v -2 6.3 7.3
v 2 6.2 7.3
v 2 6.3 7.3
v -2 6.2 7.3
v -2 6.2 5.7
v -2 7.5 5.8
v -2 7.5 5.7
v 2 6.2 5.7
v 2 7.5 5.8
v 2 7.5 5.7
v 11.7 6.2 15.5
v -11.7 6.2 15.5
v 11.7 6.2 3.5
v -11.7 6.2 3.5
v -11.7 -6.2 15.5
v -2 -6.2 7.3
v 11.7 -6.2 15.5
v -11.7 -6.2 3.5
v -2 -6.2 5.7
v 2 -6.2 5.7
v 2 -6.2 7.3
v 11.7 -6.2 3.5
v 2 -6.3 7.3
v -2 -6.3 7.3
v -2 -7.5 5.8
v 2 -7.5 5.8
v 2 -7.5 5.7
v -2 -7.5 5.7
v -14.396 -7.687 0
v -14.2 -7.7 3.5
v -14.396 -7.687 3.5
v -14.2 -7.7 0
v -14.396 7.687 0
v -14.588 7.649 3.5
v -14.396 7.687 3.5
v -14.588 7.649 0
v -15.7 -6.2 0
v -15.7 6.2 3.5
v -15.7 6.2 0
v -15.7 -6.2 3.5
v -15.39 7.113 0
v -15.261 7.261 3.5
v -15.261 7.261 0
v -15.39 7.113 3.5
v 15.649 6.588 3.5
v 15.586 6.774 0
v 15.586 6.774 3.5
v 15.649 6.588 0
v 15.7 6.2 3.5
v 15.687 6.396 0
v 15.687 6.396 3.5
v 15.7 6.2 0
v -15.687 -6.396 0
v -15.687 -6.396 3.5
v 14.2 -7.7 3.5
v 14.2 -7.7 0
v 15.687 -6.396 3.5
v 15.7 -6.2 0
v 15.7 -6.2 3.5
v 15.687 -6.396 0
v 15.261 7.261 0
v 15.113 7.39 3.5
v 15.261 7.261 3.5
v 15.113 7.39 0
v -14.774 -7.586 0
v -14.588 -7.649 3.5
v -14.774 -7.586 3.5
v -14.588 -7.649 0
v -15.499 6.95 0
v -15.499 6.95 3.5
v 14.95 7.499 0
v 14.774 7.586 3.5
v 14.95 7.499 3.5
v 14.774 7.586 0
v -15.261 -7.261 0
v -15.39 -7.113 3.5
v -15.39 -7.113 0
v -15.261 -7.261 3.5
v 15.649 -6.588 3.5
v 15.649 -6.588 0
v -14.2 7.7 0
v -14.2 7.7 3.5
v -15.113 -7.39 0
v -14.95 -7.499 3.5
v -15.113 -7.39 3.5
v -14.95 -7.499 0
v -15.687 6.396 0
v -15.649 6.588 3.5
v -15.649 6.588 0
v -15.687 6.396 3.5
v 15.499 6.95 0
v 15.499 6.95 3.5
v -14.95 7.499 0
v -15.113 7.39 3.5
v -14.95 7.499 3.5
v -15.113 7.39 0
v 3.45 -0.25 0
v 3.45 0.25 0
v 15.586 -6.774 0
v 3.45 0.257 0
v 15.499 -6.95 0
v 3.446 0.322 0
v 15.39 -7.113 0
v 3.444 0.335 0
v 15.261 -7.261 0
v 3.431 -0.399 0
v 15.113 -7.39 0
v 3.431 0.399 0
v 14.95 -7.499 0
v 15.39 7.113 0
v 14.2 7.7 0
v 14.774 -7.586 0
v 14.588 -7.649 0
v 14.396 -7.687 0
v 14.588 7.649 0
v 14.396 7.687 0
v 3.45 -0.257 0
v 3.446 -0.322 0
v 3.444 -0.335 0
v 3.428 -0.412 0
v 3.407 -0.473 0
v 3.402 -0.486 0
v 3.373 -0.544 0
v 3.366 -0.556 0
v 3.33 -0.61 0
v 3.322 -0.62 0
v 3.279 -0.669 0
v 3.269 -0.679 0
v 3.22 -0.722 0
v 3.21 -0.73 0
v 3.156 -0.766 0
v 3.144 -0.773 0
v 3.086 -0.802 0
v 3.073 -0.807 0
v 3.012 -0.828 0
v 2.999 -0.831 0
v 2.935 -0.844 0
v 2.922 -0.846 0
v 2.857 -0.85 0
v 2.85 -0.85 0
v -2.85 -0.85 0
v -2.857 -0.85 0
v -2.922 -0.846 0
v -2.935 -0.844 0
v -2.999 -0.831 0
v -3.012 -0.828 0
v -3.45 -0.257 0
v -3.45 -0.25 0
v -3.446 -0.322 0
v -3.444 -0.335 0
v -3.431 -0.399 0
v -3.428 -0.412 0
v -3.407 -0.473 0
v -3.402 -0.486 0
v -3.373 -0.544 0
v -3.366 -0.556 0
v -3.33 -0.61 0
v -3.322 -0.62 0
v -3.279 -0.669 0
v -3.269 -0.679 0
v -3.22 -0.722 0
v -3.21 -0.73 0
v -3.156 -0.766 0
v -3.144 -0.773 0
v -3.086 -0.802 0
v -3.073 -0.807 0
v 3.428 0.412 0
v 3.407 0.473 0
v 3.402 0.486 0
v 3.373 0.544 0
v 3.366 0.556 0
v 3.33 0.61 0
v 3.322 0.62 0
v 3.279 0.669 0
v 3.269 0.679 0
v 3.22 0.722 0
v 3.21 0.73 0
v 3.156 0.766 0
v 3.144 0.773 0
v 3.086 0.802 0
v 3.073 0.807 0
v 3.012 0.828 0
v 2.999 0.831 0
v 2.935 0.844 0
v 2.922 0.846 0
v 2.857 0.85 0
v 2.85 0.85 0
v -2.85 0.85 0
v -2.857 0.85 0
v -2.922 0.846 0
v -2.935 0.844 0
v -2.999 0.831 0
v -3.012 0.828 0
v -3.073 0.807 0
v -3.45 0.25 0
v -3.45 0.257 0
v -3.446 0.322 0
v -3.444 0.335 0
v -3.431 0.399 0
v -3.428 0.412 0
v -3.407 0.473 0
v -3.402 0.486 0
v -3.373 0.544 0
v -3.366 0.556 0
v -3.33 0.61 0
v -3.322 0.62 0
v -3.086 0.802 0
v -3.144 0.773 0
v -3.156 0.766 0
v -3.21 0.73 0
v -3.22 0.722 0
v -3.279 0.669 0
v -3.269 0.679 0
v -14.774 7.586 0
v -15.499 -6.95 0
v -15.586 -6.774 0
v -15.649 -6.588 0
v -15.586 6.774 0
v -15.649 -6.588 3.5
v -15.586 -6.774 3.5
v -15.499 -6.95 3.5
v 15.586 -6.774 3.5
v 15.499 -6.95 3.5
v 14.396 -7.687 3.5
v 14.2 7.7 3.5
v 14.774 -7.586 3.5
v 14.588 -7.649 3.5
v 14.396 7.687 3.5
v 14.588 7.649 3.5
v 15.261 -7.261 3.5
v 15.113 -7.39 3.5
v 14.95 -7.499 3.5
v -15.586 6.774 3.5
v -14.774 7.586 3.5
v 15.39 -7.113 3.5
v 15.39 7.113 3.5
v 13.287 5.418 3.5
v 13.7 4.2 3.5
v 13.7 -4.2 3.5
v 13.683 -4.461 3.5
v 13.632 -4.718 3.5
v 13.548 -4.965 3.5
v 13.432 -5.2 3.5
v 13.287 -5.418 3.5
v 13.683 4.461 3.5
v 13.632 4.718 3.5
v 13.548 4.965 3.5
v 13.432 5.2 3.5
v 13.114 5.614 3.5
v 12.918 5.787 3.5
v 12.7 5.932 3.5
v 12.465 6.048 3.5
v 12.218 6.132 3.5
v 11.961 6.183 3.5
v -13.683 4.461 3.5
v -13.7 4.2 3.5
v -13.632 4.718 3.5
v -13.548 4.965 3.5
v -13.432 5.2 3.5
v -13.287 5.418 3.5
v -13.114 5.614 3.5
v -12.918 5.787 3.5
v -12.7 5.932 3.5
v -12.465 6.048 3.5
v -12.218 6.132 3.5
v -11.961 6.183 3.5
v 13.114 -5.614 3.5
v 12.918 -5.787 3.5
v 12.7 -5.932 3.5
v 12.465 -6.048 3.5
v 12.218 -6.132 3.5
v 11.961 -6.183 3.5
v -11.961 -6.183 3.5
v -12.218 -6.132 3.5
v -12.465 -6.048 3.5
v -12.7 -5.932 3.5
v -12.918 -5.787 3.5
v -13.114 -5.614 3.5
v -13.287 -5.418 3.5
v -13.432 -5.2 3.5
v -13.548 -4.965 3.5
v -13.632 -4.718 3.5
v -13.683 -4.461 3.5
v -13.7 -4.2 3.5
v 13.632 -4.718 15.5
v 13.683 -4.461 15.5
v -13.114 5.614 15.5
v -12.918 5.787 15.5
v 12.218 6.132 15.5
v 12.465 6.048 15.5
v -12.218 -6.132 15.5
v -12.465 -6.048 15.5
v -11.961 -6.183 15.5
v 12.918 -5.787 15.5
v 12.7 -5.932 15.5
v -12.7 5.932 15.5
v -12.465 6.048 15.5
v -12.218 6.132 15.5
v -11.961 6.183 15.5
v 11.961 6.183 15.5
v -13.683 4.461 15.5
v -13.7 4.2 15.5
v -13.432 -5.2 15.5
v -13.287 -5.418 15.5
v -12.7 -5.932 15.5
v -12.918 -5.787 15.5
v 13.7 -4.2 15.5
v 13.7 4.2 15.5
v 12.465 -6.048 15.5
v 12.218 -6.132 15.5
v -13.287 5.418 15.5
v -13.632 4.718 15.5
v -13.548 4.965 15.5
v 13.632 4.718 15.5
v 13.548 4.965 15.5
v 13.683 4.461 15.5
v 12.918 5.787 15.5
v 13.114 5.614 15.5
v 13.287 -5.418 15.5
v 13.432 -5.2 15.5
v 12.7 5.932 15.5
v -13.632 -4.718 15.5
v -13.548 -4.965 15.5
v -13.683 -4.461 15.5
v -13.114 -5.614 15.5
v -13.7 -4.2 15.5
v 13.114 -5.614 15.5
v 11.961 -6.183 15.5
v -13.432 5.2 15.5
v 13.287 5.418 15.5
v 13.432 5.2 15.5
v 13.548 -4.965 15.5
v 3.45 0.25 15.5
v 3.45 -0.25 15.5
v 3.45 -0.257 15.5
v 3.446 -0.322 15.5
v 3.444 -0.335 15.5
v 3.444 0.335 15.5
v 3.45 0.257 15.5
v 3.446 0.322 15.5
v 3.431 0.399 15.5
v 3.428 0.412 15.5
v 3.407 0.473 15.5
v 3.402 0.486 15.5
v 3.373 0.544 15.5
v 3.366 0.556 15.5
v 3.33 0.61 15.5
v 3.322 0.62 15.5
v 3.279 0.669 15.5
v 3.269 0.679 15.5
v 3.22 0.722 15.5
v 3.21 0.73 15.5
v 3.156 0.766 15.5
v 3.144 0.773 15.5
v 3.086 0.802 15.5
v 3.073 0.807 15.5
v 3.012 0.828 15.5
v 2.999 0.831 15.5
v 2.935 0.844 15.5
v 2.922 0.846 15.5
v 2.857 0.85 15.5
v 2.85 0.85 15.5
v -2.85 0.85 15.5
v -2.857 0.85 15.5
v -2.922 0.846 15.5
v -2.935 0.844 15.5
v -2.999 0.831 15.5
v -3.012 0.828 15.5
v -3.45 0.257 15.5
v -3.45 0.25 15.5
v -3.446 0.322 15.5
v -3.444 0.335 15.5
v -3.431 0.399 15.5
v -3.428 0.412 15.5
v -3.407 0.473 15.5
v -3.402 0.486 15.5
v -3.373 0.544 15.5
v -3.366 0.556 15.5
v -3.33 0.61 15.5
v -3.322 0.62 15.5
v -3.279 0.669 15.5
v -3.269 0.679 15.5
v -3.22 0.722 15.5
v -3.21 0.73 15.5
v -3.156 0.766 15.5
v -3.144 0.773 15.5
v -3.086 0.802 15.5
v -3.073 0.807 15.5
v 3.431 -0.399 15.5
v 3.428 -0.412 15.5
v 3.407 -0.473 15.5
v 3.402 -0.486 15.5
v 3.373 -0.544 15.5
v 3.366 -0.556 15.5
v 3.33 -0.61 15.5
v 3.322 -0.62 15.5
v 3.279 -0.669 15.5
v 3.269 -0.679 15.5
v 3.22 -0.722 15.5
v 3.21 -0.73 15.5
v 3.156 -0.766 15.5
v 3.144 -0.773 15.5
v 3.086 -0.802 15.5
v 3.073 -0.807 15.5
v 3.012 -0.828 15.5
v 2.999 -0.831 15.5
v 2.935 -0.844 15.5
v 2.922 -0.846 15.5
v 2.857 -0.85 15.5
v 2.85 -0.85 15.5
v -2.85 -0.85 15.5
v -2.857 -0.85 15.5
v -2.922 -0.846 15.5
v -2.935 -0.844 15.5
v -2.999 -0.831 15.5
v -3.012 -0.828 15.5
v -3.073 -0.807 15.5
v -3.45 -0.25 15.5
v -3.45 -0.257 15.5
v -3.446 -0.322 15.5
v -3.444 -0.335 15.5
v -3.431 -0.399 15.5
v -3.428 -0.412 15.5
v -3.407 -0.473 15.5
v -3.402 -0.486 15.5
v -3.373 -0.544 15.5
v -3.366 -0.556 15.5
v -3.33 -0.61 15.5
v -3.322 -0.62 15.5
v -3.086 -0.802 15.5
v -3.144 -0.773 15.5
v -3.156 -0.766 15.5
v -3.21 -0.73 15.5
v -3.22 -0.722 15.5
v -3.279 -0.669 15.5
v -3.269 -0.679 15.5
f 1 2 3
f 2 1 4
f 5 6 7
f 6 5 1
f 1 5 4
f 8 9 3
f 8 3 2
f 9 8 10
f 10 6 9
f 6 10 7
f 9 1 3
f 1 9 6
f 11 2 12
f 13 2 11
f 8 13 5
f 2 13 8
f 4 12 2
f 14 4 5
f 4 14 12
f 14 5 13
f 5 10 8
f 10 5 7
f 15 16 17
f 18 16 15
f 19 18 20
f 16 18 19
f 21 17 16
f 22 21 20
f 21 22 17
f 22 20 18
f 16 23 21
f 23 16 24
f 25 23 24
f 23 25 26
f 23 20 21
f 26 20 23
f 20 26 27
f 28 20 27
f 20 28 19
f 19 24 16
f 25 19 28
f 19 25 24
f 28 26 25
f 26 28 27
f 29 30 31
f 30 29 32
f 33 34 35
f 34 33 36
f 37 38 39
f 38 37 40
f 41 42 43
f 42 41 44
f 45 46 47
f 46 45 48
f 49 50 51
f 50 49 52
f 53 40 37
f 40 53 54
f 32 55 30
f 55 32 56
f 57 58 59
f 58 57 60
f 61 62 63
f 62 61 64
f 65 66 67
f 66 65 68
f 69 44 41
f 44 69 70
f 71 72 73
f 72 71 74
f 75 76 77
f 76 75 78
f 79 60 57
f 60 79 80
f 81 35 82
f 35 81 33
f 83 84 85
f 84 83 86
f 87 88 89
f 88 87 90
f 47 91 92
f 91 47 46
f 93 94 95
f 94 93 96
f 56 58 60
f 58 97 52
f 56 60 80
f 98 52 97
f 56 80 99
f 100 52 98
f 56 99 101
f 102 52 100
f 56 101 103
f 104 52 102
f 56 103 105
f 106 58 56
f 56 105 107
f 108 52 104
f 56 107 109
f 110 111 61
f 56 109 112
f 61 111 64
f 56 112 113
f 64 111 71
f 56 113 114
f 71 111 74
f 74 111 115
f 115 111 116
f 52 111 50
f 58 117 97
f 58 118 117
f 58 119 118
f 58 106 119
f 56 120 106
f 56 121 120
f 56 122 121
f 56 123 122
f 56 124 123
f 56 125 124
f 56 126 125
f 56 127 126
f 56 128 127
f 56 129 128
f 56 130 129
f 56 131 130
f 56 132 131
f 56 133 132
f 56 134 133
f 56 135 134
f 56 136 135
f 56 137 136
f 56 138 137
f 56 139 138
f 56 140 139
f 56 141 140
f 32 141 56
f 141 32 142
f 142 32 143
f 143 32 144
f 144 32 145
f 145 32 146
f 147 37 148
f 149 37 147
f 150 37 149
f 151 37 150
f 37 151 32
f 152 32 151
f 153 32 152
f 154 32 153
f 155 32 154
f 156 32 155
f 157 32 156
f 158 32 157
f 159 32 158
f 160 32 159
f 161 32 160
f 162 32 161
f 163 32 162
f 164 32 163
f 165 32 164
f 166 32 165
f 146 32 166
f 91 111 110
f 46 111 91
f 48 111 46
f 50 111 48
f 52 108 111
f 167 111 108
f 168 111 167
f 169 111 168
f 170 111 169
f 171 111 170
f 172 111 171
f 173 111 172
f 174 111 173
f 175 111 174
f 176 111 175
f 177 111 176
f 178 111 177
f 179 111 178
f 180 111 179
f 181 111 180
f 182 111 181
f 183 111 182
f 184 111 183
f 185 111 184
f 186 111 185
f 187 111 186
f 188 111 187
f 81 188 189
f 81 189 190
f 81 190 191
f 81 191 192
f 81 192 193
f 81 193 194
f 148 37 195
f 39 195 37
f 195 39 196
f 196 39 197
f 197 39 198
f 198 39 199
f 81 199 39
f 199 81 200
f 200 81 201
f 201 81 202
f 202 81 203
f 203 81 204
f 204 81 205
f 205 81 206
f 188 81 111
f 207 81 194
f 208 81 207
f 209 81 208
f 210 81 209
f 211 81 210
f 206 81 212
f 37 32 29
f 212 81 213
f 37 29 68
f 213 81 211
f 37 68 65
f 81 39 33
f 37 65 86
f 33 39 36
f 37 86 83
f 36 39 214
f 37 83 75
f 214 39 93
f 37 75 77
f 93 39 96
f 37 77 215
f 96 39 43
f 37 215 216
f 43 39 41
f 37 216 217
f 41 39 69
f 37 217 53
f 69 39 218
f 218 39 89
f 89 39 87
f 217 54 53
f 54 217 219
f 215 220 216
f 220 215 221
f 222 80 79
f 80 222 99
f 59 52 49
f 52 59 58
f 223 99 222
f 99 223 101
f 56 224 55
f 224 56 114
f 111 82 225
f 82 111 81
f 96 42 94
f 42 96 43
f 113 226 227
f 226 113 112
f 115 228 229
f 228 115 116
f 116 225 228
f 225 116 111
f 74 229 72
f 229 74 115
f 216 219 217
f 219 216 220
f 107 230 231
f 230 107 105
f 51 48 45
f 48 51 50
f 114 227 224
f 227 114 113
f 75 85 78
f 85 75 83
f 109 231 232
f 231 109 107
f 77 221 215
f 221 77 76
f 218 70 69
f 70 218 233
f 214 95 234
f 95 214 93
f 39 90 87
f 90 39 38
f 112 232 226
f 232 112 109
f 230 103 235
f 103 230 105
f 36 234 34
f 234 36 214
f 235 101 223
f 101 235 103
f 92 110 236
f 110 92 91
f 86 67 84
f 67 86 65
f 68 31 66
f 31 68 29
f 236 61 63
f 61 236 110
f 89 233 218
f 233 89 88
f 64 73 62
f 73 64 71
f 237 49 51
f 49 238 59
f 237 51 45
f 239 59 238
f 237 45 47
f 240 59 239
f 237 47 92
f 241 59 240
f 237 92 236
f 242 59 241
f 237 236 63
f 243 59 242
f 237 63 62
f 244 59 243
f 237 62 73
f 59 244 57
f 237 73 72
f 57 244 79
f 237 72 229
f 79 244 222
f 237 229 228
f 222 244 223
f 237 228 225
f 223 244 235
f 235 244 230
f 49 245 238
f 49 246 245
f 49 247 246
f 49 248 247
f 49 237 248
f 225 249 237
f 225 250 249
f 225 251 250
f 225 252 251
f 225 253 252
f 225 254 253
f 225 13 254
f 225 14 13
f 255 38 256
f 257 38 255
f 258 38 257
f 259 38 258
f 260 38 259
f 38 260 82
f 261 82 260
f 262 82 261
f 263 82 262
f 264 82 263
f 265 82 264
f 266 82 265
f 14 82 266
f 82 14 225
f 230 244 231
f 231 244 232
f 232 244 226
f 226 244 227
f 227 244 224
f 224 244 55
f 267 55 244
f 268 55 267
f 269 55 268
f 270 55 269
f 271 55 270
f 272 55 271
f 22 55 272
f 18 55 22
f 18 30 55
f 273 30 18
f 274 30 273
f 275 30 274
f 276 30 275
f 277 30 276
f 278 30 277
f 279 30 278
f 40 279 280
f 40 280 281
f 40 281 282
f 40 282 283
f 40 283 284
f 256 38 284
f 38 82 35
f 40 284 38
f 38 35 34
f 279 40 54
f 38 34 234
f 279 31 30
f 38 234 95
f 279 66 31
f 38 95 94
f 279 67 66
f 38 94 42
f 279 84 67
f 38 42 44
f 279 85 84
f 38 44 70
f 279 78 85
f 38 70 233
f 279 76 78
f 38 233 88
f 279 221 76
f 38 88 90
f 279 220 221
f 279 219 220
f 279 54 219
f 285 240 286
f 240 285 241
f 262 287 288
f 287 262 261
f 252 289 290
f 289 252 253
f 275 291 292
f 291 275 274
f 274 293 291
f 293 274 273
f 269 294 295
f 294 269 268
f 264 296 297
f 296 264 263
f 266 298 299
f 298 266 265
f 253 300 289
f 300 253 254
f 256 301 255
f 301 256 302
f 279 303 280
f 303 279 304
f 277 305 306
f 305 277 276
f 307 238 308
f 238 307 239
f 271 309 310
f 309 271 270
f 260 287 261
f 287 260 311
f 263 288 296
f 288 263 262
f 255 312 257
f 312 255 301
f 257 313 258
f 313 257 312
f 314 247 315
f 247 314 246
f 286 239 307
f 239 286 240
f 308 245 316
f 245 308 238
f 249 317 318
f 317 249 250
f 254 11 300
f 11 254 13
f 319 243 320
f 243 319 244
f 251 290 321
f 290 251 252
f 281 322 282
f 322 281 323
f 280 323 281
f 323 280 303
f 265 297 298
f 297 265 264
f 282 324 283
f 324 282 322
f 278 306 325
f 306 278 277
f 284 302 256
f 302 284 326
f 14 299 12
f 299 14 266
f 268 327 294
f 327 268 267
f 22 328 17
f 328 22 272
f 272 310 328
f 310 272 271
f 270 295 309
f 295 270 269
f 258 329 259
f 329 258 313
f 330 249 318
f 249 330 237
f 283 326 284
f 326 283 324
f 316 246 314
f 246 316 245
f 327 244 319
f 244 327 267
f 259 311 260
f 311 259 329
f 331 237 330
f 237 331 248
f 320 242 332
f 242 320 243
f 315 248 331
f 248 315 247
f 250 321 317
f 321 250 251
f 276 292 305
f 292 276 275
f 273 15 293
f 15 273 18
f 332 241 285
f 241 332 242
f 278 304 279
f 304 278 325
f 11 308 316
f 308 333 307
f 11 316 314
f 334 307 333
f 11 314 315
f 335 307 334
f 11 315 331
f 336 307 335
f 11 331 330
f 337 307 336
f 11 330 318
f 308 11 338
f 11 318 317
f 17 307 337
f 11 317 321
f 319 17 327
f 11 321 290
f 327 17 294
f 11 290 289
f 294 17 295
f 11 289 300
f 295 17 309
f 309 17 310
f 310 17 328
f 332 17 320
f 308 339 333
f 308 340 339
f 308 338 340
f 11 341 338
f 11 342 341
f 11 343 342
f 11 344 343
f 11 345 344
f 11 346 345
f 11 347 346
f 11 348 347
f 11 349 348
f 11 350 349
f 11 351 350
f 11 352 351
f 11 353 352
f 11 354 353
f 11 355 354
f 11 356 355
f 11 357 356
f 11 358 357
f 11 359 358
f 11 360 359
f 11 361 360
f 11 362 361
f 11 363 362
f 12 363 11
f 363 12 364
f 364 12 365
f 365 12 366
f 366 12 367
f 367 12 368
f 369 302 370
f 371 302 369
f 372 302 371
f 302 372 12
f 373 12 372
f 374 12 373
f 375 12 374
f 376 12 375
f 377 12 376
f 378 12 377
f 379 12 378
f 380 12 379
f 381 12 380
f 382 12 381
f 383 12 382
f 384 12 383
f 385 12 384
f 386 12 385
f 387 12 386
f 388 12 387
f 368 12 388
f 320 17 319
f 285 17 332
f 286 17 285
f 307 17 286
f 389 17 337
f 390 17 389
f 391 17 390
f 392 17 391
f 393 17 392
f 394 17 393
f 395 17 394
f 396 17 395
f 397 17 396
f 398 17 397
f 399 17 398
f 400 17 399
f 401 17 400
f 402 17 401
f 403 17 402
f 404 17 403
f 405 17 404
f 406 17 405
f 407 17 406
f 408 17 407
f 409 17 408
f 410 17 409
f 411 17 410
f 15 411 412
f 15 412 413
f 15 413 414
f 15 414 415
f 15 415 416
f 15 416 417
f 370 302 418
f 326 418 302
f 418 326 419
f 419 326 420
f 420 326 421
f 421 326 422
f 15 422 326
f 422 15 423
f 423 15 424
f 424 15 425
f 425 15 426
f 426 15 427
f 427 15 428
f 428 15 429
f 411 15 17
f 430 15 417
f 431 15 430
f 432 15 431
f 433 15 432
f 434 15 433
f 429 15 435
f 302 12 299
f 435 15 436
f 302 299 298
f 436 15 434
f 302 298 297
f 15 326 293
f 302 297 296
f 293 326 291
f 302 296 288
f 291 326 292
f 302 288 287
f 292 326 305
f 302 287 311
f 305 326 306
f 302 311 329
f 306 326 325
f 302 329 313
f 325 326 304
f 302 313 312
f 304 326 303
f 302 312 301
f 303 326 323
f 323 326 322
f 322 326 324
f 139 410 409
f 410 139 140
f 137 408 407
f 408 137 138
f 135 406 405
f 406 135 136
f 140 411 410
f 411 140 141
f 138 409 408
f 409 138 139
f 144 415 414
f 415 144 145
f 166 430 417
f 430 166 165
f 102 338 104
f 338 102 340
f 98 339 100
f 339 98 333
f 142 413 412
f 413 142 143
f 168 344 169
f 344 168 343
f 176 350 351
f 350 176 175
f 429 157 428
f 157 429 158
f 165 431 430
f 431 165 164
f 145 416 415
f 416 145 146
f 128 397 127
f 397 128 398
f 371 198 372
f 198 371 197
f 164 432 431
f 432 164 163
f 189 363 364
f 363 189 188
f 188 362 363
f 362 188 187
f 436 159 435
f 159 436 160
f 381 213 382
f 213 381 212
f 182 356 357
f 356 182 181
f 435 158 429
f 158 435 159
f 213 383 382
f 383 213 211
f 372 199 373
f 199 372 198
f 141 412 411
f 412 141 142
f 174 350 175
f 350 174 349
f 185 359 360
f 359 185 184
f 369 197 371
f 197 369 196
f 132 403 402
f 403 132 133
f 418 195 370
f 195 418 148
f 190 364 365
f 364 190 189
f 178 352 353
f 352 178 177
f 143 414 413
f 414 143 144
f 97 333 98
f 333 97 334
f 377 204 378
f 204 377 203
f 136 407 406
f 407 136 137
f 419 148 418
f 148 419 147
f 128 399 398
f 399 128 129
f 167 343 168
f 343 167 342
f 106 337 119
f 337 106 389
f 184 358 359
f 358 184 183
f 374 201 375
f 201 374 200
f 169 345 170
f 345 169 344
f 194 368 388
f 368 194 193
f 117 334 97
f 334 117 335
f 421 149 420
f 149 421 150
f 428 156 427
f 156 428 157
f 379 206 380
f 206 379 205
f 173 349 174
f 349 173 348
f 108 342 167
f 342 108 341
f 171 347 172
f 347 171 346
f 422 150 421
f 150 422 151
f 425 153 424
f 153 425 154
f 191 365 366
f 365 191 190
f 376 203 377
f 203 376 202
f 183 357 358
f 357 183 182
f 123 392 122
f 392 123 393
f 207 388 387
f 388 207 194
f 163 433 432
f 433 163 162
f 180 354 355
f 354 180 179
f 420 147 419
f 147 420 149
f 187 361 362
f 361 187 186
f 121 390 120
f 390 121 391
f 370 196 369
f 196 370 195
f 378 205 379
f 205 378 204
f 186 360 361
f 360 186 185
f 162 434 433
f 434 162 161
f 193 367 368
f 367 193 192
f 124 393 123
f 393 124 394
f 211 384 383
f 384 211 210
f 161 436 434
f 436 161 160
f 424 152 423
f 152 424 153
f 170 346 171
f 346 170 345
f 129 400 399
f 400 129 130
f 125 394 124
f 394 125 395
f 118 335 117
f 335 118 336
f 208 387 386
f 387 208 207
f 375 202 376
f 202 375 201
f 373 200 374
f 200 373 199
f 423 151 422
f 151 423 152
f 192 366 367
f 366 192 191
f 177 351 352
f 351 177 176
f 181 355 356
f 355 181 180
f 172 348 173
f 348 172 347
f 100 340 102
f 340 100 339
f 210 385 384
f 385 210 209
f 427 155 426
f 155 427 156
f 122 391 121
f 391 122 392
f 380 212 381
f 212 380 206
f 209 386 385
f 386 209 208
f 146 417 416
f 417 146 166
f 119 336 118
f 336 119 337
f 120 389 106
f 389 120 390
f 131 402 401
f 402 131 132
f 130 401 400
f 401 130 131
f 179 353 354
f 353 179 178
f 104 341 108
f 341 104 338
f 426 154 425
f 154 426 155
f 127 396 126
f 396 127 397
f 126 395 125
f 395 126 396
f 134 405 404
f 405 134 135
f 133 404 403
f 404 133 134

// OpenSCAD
// file: parameters.scad
// ============================================
// MODULAR CABLE ORGANIZER - SHARED PARAMETERS
// ============================================
// All dimensions in mm - include this in all files
// ============================================

$fn = 48;

// === TOLERANCES ===
clearance = 0.3;
port_clearance = 0.1;  // Extra clearance for port openings (reduced - 0.2 was too loose for USB-C)
wall = 1.6;

// === SLOT DIMENSIONS (2:1 aspect ratio) - scaled to 2/3 ===
slot_width = 32;  // Reduced by 1mm for more compact insert
slot_height = 16;  // Reduced by 1mm for more compact insert
slot_depth = 4;  // Reduced from 6mm - less frame depth needed

// === FRAME STRUCTURE ===
frame_wall = 0.5;   // Reduced for more compact frame
frame_border = 8;  // Increased by 10mm for mounting holes with countersink
frame_back = 2;     // Slightly thicker for snap catch strength
mount_hole_dia = 3;
countersink_dia = 6;  // Diameter of countersink for screw heads
countersink_depth = 2;  // Depth of countersink

// === GRID ===
grid_cols = 2;
grid_rows = 2;

// === INSERT BASE DIMENSIONS ===
insert_width = slot_width - (2 * clearance);
insert_height = slot_height - (2 * clearance);
insert_base_depth = slot_depth - 0.5;

// === INSERT BODY (protrudes from frame) ===
insert_body_width = insert_width - 4;
insert_body_height = insert_height - 3;
insert_body_depth = 12;  // Deep enough to accommodate male cable connectors
insert_top_thick = 1.5;  // Top platform thickness

// === SNAP TABS (on neck/body - catch on back plate) ===
snap_tab_width = 4;
snap_tab_protrude = 1.2;  // How far tab sticks out from body
snap_tab_thick = 1.5;     // Z thickness of tab
snap_tab_offset = 2.2;      // Distance from base to tab bottom on insert (increased to clear frame)

// === CONNECTOR PORT DIMENSIONS & BODY DEPTHS ===
// Port dimensions from reference blueprints
// Body depths sized to match typical male connector lengths

// USB-C: 8.4 x 2.6mm, male connector ~9mm
usbc_w = 8.4;
usbc_h = 2.6;
usbc_r = 1.0;
usbc_body_depth = 9;

// USB-A: 14.0 x 6.5mm, male connector ~13mm
usba_w = 14.0;
usba_h = 6.5;
usba_r = 0.5;
usba_body_depth = 13;

// USB Mini: 6.9 x 3.0mm, male connector ~9mm
usb_mini_w = 6.9;
usb_mini_h = 3.0;
usb_mini_r = 0.5;
usb_mini_body_depth = 9;

// USB Micro: 6.9 x 1.8mm, male connector ~7mm
usb_micro_w = 6.9;
usb_micro_h = 1.8;
usb_micro_r = 0.3;
usb_micro_body_depth = 7;

// USB-B: 8.0 x 7.5mm, male connector ~14mm
usb_b_w = 8.0;
usb_b_h = 7.5;
usb_b_r = 1.0;
usb_b_body_depth = 14;

// Lightning: 6.7 x 1.5mm, male connector ~8mm
lightning_w = 6.7;
lightning_h = 1.5;
lightning_r = 0.5;
lightning_body_depth = 8;

// HDMI: 14.0 x 4.5mm, male connector ~16mm
hdmi_w = 14.0;
hdmi_h = 4.5;
hdmi_r = 0.5;
hdmi_body_depth = 16;

// 3.5mm Audio Jack: male plug ~14mm
audio_jack_dia = 6.0;
audio_jack_body_depth = 14;

// Blank/Label: recessed area for label
label_w = 30;
label_h = 12;
label_depth = 0.8;

// === CALCULATED VALUES ===
frame_total_depth = frame_back + slot_depth;
grid_width = (grid_cols * slot_width) + ((grid_cols - 1) * frame_wall);
grid_height = (grid_rows * slot_height) + ((grid_rows - 1) * frame_wall);
frame_width = grid_width + (2 * frame_border);
frame_height_total = grid_height + (2 * frame_border);
insert_total_depth = insert_base_depth + insert_body_depth;
// file: insert_base.scad
// ============================================
// MODULAR CABLE ORGANIZER - BASE INSERT MODULE
// ============================================
// This is the parent module for all insert types
// Include this file and call insert_with_port() with a port shape
// ============================================

include <parameters.scad>

// === BASE INSERT WITH CUSTOM BODY DEPTH ===
module insert_blank_custom(body_depth) {
    union() {
        // Base plate (sits in frame slot)
        rounded_box_rect(insert_width, insert_height, insert_base_depth, 1.5);
        
        // Body (protrudes out front) - custom depth
        translate([0, 0, insert_base_depth])
            rounded_box_rect(insert_body_width, insert_body_height, body_depth, 2);
        
        // Snap tabs on all 4 sides
        snap_tabs_all();
    }
}

// === BASE INSERT (default depth - for backwards compatibility) ===
module insert_blank() {
    insert_blank_custom(insert_body_depth);
}

// === INSERT WITH THROUGH-HOLE PORT (custom depth) ===
// Pass body_depth and a 2D shape as children
module insert_with_port_custom(body_depth) {
    total_depth = insert_base_depth + body_depth;
    difference() {
        insert_blank_custom(body_depth);
        
        // Cut port hole ALL THE WAY through (tube shape)
        translate([0, 0, -0.1])
            linear_extrude(total_depth + 0.2)
            offset(r=port_clearance)  // Add clearance to port opening
            children();
    }
}

// === INSERT WITH THROUGH-HOLE PORT (default depth) ===
module insert_with_port() {
    insert_with_port_custom(insert_body_depth) children();
}

// === PRE-MADE INSERT MODULES WITH CORRECT DEPTHS ===
module insert_usbc() {
    insert_with_port_custom(usbc_body_depth) port_usbc();
}

module insert_usba() {
    insert_with_port_custom(usba_body_depth) port_usba();
}

module insert_usb_mini() {
    insert_with_port_custom(usb_mini_body_depth) port_usb_mini();
}

module insert_usb_micro() {
    insert_with_port_custom(usb_micro_body_depth) port_usb_micro();
}

module insert_usb_b() {
    insert_with_port_custom(usb_b_body_depth) port_usb_b();
}

module insert_lightning() {
    insert_with_port_custom(lightning_body_depth) port_lightning();
}

module insert_hdmi() {
    insert_with_port_custom(hdmi_body_depth) port_hdmi();
}

module insert_audio_jack() {
    insert_with_port_custom(audio_jack_body_depth) port_audio_jack();
}

// === SNAP TABS (on neck/body - catch on frame cutouts) ===
// Tabs are on the body, positioned to engage with frame wall cutouts
module snap_tabs_all() {
    // Position tabs up on body (clear of base/frame)
    tab_z = insert_base_depth + snap_tab_offset;
    
    // Tabs on all 4 sides of the body
    for (angle = [0, 90, 180, 270]) {
        rotate([0, 0, angle])
            translate([0, insert_body_height/2, tab_z])
            neck_snap_tab();
    }
}

module neck_snap_tab() {
    // Wedge shape (FLIPPED): 
    // - Peak/taper on BOTTOM - slides past back plate when inserting
    // - Flat on TOP - catches and holds
    hull() {
        // Peak of wedge (protruding, at BOTTOM of tab)
        translate([-snap_tab_width/2, snap_tab_protrude, 0])
            cube([snap_tab_width, 0.1, 0.1]);
        // Flat top (at body surface, TOP of tab)
        translate([-snap_tab_width/2, 0, snap_tab_thick])
            cube([snap_tab_width, 0.1, 0.1]);
        // Base of wedge (at body surface, bottom)
        translate([-snap_tab_width/2, 0, 0])
            cube([snap_tab_width, 0.1, 0.1]);
    }
}

module snap_tab_horizontal() {
    hull() {
        translate([0, -snap_tab_protrude/2, 0])
            cube([snap_tab_width, 0.1, snap_tab_thick], center=true);
        translate([0, snap_tab_protrude/2, snap_tab_thick * 0.2])
            cube([snap_tab_width, 0.1, snap_tab_thick * 0.6], center=true);
    }
}

module snap_tab_vertical() {
    hull() {
        translate([-snap_tab_protrude/2, 0, 0])
            cube([0.1, snap_tab_width, snap_tab_thick], center=true);
        translate([snap_tab_protrude/2, 0, snap_tab_thick * 0.2])
            cube([0.1, snap_tab_width, snap_tab_thick * 0.6], center=true);
    }
}

// === UTILITY MODULES ===
module rounded_box_rect(w, d, h, r) {
    translate([0, 0, h/2])
        hull() {
            for (x = [-1, 1], y = [-1, 1])
                translate([x * (w/2 - r), y * (d/2 - r), 0])
                    cylinder(h=h, r=r, center=true);
        }
}

// === PORT SHAPE MODULES (2D) ===
// These define the cutout shapes for each connector type

module port_rounded_rect(w, h, r) {
    // Standard rounded rectangle
    hull() {
        for (x = [-1, 1], y = [-1, 1])
            translate([x * (w/2 - r), y * (h/2 - r)])
                circle(r=r);
    }
}

module port_usbc() {
    port_rounded_rect(usbc_w, usbc_h, usbc_r);
}

module port_usba() {
    port_rounded_rect(usba_w, usba_h, usba_r);
}

module port_usb_mini() {
    port_rounded_rect(usb_mini_w, usb_mini_h, usb_mini_r);
}

module port_usb_micro() {
    port_rounded_rect(usb_micro_w, usb_micro_h, usb_micro_r);
}

module port_usb_b() {
    // USB-B has beveled top corners
    hull() {
        // Bottom corners (full radius)
        for (x = [-1, 1])
            translate([x * (usb_b_w/2 - usb_b_r), -(usb_b_h/2 - usb_b_r)])
                circle(r=usb_b_r);
        // Top corners (chamfered - moved inward)
        for (x = [-1, 1])
            translate([x * (usb_b_w/2 - usb_b_r - 1), (usb_b_h/2 - usb_b_r)])
                circle(r=usb_b_r);
    }
}

module port_lightning() {
    port_rounded_rect(lightning_w, lightning_h, lightning_r);
}

module port_hdmi() {
    // HDMI is tapered (wider at top)
    hull() {
        // Top (wider)
        for (x = [-1, 1])
            translate([x * (hdmi_w/2 - hdmi_r), (hdmi_h/2 - hdmi_r)])
                circle(r=hdmi_r);
        // Bottom (narrower)
        for (x = [-1, 1])
            translate([x * (hdmi_w/2 - hdmi_r - 1), -(hdmi_h/2 - hdmi_r)])
                circle(r=hdmi_r);
    }
}

module port_audio_jack() {
    circle(d=audio_jack_dia);
}

module port_label_recess() {
    // Shallow rectangular recess for labels
    square([label_w, label_h], center=true);
}

// === RENDER (for testing this file directly) ===
// insert_blank();
// main file
// ============================================
// LIGHTNING FEMALE INSERT
// Port: 6.7mm x 1.5mm rounded rectangle
// ============================================

include <insert_base.scad>

module insert_lightning() {
    insert_with_port() port_lightning();
}

// Render
insert_lightning();
